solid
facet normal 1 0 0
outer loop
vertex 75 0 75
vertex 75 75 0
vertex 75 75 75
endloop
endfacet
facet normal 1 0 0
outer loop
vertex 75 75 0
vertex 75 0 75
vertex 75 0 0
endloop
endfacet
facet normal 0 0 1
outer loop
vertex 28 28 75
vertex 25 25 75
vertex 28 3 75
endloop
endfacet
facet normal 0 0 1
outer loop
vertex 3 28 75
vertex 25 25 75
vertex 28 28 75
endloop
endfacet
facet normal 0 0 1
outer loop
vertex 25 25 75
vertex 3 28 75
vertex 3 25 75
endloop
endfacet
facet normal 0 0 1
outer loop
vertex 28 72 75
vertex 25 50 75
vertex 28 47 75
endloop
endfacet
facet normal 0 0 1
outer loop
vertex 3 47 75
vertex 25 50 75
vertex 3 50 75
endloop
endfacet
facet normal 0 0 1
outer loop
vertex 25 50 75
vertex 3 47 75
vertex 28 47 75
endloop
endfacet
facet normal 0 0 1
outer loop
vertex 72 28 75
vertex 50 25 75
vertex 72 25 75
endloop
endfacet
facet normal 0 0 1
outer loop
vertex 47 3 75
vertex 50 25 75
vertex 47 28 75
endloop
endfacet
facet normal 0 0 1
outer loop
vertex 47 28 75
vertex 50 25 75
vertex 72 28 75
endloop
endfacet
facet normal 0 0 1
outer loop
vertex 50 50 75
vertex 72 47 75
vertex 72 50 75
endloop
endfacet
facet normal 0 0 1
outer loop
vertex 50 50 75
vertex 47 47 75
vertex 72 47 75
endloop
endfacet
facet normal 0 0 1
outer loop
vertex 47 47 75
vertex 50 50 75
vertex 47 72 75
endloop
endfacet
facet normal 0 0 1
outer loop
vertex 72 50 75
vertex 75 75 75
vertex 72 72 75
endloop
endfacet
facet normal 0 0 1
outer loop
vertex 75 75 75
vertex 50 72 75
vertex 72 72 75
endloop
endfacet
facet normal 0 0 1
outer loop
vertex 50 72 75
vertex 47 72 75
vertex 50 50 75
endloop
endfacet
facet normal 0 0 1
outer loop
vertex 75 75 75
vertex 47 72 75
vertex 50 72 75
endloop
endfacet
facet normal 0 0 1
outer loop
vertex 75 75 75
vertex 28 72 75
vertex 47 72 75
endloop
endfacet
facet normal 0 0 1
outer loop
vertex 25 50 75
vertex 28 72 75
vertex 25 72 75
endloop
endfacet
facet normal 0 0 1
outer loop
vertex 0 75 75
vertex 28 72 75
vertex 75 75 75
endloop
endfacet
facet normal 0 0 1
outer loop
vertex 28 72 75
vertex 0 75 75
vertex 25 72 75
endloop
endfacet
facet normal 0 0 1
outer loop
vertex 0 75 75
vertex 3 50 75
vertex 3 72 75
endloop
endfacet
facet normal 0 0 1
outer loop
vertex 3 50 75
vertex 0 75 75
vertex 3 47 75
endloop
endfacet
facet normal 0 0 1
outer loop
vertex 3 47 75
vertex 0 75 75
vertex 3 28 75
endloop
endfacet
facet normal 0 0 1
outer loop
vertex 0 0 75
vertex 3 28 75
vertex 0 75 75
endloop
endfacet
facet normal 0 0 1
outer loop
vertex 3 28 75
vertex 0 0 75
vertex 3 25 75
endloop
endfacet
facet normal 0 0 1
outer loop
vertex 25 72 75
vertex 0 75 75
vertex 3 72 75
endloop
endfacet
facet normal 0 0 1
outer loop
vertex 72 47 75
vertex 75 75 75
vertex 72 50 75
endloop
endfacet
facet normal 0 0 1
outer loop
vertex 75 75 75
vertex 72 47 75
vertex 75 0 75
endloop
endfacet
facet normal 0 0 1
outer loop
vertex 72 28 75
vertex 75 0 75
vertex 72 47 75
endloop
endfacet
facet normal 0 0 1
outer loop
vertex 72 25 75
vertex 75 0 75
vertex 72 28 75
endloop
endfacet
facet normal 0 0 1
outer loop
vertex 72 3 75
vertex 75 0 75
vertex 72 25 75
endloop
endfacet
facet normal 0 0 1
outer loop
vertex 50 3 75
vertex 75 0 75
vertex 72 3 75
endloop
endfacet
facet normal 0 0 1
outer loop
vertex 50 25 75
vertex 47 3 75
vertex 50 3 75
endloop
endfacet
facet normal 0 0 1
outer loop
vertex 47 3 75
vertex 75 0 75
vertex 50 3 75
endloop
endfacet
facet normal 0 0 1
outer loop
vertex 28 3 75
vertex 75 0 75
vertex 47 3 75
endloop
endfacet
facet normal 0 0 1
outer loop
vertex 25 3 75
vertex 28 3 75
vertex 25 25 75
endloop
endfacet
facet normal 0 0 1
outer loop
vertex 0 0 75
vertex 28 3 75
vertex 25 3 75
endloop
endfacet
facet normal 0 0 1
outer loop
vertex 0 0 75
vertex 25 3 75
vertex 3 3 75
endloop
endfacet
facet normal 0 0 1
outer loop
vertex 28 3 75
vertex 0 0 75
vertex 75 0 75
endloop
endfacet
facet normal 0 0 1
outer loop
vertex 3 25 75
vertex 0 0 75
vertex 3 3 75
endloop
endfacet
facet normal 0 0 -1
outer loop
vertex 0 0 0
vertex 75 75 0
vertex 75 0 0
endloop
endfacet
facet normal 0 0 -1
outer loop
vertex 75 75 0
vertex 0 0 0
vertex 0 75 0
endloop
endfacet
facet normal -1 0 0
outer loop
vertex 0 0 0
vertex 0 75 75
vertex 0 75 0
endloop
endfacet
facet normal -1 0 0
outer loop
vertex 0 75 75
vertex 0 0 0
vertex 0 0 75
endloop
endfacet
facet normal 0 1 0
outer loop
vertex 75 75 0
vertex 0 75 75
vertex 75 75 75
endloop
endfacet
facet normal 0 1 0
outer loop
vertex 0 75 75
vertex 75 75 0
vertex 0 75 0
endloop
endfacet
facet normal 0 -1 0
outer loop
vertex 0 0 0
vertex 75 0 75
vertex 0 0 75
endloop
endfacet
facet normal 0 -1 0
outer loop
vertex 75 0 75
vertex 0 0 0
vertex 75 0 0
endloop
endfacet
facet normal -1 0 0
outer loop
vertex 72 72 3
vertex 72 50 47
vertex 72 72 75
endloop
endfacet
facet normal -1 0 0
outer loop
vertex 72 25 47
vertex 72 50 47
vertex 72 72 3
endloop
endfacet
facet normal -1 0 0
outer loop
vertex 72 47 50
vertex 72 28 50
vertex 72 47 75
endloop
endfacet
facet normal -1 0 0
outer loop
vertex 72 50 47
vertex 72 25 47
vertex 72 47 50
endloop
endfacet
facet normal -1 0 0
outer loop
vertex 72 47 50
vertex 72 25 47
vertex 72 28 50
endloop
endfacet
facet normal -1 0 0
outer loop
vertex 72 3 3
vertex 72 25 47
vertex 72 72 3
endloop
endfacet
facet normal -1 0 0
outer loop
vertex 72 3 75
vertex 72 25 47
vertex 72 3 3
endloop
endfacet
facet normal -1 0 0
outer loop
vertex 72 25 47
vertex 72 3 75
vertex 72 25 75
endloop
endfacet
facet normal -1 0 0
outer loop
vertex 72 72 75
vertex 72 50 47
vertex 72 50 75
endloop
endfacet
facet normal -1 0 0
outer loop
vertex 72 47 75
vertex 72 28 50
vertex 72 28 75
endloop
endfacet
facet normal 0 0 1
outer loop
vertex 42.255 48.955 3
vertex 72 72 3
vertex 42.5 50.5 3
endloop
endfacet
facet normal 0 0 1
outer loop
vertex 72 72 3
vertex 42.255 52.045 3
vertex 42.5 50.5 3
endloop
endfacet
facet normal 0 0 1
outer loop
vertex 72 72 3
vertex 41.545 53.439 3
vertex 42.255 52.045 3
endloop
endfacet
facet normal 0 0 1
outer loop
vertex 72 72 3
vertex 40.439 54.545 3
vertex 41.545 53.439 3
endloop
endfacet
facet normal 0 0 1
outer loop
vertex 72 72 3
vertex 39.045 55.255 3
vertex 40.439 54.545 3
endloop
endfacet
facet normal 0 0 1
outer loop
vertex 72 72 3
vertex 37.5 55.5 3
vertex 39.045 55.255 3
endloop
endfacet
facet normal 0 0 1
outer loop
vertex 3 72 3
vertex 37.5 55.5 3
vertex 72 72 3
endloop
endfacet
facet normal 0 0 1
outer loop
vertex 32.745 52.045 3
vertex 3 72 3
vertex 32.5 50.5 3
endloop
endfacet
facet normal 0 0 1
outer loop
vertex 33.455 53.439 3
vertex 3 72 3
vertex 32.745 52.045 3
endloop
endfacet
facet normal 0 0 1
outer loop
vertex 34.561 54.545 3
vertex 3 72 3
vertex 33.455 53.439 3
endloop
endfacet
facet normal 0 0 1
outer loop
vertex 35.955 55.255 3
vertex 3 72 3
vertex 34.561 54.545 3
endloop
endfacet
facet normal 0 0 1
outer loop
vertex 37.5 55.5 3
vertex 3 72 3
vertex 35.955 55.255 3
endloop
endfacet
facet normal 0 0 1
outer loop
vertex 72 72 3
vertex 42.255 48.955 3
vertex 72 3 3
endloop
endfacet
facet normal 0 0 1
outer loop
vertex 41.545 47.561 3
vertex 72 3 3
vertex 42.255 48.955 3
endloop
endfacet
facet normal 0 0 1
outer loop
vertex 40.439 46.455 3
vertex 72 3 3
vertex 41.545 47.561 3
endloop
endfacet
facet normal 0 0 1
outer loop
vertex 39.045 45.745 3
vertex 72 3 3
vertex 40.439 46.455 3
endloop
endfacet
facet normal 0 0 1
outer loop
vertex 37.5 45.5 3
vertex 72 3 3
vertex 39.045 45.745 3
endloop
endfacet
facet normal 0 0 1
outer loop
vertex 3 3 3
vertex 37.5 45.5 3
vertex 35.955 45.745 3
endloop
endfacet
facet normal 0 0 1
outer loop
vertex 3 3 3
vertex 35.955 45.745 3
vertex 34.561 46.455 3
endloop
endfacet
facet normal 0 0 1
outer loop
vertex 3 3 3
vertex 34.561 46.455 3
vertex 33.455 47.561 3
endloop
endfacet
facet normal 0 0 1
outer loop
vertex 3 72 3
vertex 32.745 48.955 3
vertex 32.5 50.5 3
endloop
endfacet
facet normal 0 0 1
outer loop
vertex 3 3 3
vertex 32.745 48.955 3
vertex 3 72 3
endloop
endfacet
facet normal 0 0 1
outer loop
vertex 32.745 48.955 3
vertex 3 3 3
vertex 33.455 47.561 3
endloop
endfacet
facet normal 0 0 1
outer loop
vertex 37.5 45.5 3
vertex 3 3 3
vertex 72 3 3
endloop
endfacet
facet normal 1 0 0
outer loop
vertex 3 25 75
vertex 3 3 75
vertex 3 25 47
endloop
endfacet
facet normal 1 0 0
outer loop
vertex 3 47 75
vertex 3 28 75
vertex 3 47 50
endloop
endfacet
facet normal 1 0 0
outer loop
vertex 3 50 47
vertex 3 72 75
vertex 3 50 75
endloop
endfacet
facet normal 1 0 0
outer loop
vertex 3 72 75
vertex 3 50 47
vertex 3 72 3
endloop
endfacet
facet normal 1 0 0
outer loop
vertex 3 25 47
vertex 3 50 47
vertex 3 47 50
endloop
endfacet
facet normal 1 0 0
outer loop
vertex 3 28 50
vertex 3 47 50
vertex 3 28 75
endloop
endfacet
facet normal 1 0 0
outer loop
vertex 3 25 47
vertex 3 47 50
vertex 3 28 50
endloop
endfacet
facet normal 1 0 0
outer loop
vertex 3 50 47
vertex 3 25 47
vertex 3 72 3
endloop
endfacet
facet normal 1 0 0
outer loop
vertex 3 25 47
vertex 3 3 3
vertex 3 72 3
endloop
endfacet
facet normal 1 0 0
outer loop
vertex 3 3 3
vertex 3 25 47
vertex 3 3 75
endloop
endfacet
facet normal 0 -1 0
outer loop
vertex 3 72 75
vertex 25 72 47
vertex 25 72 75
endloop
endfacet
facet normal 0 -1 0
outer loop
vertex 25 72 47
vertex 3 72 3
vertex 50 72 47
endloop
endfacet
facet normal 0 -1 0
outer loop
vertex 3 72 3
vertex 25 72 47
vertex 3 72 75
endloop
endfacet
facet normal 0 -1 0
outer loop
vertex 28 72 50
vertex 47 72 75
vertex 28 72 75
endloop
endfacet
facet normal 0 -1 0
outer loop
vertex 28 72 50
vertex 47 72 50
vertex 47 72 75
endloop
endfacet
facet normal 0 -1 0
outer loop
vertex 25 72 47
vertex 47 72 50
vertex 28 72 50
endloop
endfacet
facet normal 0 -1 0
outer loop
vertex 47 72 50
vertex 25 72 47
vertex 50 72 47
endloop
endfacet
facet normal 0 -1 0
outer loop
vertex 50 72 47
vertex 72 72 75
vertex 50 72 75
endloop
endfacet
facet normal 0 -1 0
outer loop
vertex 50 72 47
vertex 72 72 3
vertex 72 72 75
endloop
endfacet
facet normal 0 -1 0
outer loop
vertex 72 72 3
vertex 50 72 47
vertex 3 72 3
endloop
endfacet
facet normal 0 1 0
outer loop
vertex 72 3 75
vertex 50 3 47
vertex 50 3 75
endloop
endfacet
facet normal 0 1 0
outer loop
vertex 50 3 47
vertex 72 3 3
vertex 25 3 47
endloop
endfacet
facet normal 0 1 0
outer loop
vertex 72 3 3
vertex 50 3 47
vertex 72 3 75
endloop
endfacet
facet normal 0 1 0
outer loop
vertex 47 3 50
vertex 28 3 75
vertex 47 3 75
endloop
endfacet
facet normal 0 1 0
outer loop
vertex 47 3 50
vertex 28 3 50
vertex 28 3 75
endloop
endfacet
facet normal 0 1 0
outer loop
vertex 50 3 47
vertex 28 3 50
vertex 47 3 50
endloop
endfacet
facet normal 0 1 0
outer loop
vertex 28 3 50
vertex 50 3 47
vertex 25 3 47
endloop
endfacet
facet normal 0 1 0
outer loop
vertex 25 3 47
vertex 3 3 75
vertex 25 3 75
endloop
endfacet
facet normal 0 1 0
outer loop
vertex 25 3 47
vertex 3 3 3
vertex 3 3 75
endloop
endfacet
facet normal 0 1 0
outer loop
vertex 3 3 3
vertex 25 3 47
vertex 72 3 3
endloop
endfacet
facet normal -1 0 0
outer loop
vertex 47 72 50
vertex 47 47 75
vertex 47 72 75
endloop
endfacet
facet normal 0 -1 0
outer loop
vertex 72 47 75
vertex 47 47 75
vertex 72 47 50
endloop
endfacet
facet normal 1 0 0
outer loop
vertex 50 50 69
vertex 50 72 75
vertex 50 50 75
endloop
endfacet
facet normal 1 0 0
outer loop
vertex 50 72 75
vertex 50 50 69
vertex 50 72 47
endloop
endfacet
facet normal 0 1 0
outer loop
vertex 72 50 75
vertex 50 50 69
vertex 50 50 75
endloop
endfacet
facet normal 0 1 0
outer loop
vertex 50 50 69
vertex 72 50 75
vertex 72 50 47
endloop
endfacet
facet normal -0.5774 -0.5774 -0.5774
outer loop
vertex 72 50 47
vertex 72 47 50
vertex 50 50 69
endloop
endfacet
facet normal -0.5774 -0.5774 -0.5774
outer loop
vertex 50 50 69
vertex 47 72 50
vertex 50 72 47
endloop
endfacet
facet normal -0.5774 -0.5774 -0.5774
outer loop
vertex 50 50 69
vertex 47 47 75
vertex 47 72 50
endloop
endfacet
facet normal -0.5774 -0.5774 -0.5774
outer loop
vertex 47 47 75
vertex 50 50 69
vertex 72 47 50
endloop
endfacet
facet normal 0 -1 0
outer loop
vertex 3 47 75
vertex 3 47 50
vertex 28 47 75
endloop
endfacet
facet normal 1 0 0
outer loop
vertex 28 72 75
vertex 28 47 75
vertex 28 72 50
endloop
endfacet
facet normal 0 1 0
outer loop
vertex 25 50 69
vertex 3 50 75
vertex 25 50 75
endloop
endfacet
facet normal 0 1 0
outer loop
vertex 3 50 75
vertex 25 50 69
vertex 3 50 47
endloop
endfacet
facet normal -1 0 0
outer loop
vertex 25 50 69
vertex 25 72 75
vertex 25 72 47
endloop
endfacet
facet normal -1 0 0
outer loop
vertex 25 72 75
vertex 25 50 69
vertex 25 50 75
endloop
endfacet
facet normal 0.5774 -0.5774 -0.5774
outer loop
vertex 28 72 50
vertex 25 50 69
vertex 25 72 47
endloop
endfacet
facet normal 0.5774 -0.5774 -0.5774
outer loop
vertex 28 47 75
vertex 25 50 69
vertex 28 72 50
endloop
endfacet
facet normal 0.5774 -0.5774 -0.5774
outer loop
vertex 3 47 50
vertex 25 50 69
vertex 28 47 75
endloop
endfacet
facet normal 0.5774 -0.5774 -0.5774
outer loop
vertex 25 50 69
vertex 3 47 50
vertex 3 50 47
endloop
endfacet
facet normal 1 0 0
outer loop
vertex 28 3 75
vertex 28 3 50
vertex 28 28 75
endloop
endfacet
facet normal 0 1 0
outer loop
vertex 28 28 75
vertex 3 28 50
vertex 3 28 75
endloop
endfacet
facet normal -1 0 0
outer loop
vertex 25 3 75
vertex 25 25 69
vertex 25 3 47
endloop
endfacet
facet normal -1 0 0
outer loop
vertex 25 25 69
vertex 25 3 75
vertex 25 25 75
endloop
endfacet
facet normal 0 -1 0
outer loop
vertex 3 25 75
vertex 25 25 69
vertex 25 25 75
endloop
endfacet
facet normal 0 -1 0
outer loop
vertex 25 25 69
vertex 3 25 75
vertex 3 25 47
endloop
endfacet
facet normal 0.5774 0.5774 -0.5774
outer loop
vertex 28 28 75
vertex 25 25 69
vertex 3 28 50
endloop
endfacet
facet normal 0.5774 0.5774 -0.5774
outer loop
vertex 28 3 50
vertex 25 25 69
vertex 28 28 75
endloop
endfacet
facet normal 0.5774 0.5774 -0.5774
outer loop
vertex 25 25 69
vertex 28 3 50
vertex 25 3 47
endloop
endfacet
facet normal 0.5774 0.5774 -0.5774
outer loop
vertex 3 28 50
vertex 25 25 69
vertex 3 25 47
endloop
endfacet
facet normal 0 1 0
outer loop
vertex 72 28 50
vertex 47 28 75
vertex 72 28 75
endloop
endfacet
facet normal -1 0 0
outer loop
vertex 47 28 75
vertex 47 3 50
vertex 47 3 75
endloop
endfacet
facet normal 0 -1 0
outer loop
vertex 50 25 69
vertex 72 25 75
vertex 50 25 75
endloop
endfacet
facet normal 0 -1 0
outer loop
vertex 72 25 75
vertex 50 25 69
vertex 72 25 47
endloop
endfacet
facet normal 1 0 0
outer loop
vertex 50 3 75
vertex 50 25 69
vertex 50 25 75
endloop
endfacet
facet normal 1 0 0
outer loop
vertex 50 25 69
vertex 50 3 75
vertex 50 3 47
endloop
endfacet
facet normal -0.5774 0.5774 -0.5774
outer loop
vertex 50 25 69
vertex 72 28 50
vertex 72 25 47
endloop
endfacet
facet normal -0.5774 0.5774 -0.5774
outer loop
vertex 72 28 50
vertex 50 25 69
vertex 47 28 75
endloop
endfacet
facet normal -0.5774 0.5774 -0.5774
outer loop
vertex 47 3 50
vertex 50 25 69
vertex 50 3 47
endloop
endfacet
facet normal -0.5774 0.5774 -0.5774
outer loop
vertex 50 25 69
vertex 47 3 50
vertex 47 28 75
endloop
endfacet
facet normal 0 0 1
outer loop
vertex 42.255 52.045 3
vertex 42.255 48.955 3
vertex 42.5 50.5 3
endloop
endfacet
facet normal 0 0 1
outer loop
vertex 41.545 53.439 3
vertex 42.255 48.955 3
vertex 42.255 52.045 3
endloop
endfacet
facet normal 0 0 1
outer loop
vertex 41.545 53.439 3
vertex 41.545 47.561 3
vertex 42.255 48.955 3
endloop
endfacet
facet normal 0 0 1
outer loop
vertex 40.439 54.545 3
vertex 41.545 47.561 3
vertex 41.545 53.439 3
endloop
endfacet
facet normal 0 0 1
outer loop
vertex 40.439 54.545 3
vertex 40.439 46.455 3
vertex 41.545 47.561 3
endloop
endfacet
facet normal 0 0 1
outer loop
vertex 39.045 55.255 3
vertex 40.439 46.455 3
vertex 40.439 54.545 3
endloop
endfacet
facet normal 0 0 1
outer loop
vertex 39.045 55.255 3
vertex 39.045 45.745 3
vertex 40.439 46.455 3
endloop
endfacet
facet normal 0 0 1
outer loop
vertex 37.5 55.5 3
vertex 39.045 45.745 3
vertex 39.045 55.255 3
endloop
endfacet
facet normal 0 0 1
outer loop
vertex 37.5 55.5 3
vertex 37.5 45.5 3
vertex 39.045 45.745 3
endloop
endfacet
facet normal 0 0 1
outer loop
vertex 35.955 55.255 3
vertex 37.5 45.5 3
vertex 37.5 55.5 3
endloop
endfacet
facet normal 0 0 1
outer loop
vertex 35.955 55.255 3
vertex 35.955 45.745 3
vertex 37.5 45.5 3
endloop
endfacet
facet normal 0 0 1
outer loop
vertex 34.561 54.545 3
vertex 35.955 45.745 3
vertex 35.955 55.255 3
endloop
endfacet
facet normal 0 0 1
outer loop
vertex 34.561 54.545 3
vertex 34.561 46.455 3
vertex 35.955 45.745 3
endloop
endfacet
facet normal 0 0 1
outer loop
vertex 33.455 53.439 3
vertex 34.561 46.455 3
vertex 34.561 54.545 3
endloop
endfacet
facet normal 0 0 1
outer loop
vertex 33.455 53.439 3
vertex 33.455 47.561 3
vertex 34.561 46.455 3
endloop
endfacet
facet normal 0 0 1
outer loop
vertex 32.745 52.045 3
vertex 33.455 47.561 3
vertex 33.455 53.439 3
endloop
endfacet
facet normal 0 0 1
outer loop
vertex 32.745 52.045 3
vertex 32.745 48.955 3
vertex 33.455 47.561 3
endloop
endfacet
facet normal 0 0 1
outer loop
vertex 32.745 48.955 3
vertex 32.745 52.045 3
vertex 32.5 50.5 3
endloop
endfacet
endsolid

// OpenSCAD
// file: cup_base.scad
include <variables.scad>;

cup_base();

module cup_base() {
     difference() {
          // make a hole on cup_base because openscad seems not to be able to substract an object
          // from an included object
          shell();
          translate([outer_size/2, outer_size/2+pipe_y-pipe_d-thickness*2, 0]) {
               cylinder(d1=pipe_d, d2=pipe_d, h=thickness);
          }
     }
     holders();
}

module shell() {
     difference() {
          cube(outer_size);
          translate([thickness,thickness,thickness])
               cube([outer_size-thickness*2, outer_size-thickness*2, outer_size-thickness]);
     }
}

holder_size = 28;
holder_inner_size = holder_size - thickness*2;
points = [[0,0,0], [holder_size,0,0], [0,holder_size,0], [0,0,holder_size]];
faces = [[0,1,2], [0,3,1], [0,2,3], [1,3,2]];

module holder() {
     difference() {
          cube([holder_size, holder_size, holder_size]);
          translate([thickness, thickness, 0]) {
               cube([holder_inner_size, holder_inner_size, holder_size]);
          }
          polyhedron(points, faces);
     }
}

module holders() {
     translate([outer_size/2, outer_size/2, outer_size-holder_size]) {
          for(angle=[0:90:359]) {
               rotate(angle) {
                    translate([outer_size/2-holder_size, outer_size/2-holder_size, 0]) {
                         holder();
                    }
               }
          }
     }
}
// file: variables.scad
$fn=20;
outer_size = 75;
thickness = 3;
pipe_d = 10;
pipe_x = pipe_d + thickness*2;
pipe_y = pipe_d*2 + thickness*3;
pipe_z = outer_size - thickness - 10;
// main file
include <variables.scad>;
include <cup_base.scad>;

cup();

module cup() {
     // make a hole on cup_base because openscad seems not to be able to substract an object
     // from an included object
     cup_base();
     translate([outer_size/2, outer_size/2+pipe_y-pipe_d-thickness*2, 0]) {
          cylinder(d1=pipe_d, d2=pipe_d, h=thickness);
     }
}
